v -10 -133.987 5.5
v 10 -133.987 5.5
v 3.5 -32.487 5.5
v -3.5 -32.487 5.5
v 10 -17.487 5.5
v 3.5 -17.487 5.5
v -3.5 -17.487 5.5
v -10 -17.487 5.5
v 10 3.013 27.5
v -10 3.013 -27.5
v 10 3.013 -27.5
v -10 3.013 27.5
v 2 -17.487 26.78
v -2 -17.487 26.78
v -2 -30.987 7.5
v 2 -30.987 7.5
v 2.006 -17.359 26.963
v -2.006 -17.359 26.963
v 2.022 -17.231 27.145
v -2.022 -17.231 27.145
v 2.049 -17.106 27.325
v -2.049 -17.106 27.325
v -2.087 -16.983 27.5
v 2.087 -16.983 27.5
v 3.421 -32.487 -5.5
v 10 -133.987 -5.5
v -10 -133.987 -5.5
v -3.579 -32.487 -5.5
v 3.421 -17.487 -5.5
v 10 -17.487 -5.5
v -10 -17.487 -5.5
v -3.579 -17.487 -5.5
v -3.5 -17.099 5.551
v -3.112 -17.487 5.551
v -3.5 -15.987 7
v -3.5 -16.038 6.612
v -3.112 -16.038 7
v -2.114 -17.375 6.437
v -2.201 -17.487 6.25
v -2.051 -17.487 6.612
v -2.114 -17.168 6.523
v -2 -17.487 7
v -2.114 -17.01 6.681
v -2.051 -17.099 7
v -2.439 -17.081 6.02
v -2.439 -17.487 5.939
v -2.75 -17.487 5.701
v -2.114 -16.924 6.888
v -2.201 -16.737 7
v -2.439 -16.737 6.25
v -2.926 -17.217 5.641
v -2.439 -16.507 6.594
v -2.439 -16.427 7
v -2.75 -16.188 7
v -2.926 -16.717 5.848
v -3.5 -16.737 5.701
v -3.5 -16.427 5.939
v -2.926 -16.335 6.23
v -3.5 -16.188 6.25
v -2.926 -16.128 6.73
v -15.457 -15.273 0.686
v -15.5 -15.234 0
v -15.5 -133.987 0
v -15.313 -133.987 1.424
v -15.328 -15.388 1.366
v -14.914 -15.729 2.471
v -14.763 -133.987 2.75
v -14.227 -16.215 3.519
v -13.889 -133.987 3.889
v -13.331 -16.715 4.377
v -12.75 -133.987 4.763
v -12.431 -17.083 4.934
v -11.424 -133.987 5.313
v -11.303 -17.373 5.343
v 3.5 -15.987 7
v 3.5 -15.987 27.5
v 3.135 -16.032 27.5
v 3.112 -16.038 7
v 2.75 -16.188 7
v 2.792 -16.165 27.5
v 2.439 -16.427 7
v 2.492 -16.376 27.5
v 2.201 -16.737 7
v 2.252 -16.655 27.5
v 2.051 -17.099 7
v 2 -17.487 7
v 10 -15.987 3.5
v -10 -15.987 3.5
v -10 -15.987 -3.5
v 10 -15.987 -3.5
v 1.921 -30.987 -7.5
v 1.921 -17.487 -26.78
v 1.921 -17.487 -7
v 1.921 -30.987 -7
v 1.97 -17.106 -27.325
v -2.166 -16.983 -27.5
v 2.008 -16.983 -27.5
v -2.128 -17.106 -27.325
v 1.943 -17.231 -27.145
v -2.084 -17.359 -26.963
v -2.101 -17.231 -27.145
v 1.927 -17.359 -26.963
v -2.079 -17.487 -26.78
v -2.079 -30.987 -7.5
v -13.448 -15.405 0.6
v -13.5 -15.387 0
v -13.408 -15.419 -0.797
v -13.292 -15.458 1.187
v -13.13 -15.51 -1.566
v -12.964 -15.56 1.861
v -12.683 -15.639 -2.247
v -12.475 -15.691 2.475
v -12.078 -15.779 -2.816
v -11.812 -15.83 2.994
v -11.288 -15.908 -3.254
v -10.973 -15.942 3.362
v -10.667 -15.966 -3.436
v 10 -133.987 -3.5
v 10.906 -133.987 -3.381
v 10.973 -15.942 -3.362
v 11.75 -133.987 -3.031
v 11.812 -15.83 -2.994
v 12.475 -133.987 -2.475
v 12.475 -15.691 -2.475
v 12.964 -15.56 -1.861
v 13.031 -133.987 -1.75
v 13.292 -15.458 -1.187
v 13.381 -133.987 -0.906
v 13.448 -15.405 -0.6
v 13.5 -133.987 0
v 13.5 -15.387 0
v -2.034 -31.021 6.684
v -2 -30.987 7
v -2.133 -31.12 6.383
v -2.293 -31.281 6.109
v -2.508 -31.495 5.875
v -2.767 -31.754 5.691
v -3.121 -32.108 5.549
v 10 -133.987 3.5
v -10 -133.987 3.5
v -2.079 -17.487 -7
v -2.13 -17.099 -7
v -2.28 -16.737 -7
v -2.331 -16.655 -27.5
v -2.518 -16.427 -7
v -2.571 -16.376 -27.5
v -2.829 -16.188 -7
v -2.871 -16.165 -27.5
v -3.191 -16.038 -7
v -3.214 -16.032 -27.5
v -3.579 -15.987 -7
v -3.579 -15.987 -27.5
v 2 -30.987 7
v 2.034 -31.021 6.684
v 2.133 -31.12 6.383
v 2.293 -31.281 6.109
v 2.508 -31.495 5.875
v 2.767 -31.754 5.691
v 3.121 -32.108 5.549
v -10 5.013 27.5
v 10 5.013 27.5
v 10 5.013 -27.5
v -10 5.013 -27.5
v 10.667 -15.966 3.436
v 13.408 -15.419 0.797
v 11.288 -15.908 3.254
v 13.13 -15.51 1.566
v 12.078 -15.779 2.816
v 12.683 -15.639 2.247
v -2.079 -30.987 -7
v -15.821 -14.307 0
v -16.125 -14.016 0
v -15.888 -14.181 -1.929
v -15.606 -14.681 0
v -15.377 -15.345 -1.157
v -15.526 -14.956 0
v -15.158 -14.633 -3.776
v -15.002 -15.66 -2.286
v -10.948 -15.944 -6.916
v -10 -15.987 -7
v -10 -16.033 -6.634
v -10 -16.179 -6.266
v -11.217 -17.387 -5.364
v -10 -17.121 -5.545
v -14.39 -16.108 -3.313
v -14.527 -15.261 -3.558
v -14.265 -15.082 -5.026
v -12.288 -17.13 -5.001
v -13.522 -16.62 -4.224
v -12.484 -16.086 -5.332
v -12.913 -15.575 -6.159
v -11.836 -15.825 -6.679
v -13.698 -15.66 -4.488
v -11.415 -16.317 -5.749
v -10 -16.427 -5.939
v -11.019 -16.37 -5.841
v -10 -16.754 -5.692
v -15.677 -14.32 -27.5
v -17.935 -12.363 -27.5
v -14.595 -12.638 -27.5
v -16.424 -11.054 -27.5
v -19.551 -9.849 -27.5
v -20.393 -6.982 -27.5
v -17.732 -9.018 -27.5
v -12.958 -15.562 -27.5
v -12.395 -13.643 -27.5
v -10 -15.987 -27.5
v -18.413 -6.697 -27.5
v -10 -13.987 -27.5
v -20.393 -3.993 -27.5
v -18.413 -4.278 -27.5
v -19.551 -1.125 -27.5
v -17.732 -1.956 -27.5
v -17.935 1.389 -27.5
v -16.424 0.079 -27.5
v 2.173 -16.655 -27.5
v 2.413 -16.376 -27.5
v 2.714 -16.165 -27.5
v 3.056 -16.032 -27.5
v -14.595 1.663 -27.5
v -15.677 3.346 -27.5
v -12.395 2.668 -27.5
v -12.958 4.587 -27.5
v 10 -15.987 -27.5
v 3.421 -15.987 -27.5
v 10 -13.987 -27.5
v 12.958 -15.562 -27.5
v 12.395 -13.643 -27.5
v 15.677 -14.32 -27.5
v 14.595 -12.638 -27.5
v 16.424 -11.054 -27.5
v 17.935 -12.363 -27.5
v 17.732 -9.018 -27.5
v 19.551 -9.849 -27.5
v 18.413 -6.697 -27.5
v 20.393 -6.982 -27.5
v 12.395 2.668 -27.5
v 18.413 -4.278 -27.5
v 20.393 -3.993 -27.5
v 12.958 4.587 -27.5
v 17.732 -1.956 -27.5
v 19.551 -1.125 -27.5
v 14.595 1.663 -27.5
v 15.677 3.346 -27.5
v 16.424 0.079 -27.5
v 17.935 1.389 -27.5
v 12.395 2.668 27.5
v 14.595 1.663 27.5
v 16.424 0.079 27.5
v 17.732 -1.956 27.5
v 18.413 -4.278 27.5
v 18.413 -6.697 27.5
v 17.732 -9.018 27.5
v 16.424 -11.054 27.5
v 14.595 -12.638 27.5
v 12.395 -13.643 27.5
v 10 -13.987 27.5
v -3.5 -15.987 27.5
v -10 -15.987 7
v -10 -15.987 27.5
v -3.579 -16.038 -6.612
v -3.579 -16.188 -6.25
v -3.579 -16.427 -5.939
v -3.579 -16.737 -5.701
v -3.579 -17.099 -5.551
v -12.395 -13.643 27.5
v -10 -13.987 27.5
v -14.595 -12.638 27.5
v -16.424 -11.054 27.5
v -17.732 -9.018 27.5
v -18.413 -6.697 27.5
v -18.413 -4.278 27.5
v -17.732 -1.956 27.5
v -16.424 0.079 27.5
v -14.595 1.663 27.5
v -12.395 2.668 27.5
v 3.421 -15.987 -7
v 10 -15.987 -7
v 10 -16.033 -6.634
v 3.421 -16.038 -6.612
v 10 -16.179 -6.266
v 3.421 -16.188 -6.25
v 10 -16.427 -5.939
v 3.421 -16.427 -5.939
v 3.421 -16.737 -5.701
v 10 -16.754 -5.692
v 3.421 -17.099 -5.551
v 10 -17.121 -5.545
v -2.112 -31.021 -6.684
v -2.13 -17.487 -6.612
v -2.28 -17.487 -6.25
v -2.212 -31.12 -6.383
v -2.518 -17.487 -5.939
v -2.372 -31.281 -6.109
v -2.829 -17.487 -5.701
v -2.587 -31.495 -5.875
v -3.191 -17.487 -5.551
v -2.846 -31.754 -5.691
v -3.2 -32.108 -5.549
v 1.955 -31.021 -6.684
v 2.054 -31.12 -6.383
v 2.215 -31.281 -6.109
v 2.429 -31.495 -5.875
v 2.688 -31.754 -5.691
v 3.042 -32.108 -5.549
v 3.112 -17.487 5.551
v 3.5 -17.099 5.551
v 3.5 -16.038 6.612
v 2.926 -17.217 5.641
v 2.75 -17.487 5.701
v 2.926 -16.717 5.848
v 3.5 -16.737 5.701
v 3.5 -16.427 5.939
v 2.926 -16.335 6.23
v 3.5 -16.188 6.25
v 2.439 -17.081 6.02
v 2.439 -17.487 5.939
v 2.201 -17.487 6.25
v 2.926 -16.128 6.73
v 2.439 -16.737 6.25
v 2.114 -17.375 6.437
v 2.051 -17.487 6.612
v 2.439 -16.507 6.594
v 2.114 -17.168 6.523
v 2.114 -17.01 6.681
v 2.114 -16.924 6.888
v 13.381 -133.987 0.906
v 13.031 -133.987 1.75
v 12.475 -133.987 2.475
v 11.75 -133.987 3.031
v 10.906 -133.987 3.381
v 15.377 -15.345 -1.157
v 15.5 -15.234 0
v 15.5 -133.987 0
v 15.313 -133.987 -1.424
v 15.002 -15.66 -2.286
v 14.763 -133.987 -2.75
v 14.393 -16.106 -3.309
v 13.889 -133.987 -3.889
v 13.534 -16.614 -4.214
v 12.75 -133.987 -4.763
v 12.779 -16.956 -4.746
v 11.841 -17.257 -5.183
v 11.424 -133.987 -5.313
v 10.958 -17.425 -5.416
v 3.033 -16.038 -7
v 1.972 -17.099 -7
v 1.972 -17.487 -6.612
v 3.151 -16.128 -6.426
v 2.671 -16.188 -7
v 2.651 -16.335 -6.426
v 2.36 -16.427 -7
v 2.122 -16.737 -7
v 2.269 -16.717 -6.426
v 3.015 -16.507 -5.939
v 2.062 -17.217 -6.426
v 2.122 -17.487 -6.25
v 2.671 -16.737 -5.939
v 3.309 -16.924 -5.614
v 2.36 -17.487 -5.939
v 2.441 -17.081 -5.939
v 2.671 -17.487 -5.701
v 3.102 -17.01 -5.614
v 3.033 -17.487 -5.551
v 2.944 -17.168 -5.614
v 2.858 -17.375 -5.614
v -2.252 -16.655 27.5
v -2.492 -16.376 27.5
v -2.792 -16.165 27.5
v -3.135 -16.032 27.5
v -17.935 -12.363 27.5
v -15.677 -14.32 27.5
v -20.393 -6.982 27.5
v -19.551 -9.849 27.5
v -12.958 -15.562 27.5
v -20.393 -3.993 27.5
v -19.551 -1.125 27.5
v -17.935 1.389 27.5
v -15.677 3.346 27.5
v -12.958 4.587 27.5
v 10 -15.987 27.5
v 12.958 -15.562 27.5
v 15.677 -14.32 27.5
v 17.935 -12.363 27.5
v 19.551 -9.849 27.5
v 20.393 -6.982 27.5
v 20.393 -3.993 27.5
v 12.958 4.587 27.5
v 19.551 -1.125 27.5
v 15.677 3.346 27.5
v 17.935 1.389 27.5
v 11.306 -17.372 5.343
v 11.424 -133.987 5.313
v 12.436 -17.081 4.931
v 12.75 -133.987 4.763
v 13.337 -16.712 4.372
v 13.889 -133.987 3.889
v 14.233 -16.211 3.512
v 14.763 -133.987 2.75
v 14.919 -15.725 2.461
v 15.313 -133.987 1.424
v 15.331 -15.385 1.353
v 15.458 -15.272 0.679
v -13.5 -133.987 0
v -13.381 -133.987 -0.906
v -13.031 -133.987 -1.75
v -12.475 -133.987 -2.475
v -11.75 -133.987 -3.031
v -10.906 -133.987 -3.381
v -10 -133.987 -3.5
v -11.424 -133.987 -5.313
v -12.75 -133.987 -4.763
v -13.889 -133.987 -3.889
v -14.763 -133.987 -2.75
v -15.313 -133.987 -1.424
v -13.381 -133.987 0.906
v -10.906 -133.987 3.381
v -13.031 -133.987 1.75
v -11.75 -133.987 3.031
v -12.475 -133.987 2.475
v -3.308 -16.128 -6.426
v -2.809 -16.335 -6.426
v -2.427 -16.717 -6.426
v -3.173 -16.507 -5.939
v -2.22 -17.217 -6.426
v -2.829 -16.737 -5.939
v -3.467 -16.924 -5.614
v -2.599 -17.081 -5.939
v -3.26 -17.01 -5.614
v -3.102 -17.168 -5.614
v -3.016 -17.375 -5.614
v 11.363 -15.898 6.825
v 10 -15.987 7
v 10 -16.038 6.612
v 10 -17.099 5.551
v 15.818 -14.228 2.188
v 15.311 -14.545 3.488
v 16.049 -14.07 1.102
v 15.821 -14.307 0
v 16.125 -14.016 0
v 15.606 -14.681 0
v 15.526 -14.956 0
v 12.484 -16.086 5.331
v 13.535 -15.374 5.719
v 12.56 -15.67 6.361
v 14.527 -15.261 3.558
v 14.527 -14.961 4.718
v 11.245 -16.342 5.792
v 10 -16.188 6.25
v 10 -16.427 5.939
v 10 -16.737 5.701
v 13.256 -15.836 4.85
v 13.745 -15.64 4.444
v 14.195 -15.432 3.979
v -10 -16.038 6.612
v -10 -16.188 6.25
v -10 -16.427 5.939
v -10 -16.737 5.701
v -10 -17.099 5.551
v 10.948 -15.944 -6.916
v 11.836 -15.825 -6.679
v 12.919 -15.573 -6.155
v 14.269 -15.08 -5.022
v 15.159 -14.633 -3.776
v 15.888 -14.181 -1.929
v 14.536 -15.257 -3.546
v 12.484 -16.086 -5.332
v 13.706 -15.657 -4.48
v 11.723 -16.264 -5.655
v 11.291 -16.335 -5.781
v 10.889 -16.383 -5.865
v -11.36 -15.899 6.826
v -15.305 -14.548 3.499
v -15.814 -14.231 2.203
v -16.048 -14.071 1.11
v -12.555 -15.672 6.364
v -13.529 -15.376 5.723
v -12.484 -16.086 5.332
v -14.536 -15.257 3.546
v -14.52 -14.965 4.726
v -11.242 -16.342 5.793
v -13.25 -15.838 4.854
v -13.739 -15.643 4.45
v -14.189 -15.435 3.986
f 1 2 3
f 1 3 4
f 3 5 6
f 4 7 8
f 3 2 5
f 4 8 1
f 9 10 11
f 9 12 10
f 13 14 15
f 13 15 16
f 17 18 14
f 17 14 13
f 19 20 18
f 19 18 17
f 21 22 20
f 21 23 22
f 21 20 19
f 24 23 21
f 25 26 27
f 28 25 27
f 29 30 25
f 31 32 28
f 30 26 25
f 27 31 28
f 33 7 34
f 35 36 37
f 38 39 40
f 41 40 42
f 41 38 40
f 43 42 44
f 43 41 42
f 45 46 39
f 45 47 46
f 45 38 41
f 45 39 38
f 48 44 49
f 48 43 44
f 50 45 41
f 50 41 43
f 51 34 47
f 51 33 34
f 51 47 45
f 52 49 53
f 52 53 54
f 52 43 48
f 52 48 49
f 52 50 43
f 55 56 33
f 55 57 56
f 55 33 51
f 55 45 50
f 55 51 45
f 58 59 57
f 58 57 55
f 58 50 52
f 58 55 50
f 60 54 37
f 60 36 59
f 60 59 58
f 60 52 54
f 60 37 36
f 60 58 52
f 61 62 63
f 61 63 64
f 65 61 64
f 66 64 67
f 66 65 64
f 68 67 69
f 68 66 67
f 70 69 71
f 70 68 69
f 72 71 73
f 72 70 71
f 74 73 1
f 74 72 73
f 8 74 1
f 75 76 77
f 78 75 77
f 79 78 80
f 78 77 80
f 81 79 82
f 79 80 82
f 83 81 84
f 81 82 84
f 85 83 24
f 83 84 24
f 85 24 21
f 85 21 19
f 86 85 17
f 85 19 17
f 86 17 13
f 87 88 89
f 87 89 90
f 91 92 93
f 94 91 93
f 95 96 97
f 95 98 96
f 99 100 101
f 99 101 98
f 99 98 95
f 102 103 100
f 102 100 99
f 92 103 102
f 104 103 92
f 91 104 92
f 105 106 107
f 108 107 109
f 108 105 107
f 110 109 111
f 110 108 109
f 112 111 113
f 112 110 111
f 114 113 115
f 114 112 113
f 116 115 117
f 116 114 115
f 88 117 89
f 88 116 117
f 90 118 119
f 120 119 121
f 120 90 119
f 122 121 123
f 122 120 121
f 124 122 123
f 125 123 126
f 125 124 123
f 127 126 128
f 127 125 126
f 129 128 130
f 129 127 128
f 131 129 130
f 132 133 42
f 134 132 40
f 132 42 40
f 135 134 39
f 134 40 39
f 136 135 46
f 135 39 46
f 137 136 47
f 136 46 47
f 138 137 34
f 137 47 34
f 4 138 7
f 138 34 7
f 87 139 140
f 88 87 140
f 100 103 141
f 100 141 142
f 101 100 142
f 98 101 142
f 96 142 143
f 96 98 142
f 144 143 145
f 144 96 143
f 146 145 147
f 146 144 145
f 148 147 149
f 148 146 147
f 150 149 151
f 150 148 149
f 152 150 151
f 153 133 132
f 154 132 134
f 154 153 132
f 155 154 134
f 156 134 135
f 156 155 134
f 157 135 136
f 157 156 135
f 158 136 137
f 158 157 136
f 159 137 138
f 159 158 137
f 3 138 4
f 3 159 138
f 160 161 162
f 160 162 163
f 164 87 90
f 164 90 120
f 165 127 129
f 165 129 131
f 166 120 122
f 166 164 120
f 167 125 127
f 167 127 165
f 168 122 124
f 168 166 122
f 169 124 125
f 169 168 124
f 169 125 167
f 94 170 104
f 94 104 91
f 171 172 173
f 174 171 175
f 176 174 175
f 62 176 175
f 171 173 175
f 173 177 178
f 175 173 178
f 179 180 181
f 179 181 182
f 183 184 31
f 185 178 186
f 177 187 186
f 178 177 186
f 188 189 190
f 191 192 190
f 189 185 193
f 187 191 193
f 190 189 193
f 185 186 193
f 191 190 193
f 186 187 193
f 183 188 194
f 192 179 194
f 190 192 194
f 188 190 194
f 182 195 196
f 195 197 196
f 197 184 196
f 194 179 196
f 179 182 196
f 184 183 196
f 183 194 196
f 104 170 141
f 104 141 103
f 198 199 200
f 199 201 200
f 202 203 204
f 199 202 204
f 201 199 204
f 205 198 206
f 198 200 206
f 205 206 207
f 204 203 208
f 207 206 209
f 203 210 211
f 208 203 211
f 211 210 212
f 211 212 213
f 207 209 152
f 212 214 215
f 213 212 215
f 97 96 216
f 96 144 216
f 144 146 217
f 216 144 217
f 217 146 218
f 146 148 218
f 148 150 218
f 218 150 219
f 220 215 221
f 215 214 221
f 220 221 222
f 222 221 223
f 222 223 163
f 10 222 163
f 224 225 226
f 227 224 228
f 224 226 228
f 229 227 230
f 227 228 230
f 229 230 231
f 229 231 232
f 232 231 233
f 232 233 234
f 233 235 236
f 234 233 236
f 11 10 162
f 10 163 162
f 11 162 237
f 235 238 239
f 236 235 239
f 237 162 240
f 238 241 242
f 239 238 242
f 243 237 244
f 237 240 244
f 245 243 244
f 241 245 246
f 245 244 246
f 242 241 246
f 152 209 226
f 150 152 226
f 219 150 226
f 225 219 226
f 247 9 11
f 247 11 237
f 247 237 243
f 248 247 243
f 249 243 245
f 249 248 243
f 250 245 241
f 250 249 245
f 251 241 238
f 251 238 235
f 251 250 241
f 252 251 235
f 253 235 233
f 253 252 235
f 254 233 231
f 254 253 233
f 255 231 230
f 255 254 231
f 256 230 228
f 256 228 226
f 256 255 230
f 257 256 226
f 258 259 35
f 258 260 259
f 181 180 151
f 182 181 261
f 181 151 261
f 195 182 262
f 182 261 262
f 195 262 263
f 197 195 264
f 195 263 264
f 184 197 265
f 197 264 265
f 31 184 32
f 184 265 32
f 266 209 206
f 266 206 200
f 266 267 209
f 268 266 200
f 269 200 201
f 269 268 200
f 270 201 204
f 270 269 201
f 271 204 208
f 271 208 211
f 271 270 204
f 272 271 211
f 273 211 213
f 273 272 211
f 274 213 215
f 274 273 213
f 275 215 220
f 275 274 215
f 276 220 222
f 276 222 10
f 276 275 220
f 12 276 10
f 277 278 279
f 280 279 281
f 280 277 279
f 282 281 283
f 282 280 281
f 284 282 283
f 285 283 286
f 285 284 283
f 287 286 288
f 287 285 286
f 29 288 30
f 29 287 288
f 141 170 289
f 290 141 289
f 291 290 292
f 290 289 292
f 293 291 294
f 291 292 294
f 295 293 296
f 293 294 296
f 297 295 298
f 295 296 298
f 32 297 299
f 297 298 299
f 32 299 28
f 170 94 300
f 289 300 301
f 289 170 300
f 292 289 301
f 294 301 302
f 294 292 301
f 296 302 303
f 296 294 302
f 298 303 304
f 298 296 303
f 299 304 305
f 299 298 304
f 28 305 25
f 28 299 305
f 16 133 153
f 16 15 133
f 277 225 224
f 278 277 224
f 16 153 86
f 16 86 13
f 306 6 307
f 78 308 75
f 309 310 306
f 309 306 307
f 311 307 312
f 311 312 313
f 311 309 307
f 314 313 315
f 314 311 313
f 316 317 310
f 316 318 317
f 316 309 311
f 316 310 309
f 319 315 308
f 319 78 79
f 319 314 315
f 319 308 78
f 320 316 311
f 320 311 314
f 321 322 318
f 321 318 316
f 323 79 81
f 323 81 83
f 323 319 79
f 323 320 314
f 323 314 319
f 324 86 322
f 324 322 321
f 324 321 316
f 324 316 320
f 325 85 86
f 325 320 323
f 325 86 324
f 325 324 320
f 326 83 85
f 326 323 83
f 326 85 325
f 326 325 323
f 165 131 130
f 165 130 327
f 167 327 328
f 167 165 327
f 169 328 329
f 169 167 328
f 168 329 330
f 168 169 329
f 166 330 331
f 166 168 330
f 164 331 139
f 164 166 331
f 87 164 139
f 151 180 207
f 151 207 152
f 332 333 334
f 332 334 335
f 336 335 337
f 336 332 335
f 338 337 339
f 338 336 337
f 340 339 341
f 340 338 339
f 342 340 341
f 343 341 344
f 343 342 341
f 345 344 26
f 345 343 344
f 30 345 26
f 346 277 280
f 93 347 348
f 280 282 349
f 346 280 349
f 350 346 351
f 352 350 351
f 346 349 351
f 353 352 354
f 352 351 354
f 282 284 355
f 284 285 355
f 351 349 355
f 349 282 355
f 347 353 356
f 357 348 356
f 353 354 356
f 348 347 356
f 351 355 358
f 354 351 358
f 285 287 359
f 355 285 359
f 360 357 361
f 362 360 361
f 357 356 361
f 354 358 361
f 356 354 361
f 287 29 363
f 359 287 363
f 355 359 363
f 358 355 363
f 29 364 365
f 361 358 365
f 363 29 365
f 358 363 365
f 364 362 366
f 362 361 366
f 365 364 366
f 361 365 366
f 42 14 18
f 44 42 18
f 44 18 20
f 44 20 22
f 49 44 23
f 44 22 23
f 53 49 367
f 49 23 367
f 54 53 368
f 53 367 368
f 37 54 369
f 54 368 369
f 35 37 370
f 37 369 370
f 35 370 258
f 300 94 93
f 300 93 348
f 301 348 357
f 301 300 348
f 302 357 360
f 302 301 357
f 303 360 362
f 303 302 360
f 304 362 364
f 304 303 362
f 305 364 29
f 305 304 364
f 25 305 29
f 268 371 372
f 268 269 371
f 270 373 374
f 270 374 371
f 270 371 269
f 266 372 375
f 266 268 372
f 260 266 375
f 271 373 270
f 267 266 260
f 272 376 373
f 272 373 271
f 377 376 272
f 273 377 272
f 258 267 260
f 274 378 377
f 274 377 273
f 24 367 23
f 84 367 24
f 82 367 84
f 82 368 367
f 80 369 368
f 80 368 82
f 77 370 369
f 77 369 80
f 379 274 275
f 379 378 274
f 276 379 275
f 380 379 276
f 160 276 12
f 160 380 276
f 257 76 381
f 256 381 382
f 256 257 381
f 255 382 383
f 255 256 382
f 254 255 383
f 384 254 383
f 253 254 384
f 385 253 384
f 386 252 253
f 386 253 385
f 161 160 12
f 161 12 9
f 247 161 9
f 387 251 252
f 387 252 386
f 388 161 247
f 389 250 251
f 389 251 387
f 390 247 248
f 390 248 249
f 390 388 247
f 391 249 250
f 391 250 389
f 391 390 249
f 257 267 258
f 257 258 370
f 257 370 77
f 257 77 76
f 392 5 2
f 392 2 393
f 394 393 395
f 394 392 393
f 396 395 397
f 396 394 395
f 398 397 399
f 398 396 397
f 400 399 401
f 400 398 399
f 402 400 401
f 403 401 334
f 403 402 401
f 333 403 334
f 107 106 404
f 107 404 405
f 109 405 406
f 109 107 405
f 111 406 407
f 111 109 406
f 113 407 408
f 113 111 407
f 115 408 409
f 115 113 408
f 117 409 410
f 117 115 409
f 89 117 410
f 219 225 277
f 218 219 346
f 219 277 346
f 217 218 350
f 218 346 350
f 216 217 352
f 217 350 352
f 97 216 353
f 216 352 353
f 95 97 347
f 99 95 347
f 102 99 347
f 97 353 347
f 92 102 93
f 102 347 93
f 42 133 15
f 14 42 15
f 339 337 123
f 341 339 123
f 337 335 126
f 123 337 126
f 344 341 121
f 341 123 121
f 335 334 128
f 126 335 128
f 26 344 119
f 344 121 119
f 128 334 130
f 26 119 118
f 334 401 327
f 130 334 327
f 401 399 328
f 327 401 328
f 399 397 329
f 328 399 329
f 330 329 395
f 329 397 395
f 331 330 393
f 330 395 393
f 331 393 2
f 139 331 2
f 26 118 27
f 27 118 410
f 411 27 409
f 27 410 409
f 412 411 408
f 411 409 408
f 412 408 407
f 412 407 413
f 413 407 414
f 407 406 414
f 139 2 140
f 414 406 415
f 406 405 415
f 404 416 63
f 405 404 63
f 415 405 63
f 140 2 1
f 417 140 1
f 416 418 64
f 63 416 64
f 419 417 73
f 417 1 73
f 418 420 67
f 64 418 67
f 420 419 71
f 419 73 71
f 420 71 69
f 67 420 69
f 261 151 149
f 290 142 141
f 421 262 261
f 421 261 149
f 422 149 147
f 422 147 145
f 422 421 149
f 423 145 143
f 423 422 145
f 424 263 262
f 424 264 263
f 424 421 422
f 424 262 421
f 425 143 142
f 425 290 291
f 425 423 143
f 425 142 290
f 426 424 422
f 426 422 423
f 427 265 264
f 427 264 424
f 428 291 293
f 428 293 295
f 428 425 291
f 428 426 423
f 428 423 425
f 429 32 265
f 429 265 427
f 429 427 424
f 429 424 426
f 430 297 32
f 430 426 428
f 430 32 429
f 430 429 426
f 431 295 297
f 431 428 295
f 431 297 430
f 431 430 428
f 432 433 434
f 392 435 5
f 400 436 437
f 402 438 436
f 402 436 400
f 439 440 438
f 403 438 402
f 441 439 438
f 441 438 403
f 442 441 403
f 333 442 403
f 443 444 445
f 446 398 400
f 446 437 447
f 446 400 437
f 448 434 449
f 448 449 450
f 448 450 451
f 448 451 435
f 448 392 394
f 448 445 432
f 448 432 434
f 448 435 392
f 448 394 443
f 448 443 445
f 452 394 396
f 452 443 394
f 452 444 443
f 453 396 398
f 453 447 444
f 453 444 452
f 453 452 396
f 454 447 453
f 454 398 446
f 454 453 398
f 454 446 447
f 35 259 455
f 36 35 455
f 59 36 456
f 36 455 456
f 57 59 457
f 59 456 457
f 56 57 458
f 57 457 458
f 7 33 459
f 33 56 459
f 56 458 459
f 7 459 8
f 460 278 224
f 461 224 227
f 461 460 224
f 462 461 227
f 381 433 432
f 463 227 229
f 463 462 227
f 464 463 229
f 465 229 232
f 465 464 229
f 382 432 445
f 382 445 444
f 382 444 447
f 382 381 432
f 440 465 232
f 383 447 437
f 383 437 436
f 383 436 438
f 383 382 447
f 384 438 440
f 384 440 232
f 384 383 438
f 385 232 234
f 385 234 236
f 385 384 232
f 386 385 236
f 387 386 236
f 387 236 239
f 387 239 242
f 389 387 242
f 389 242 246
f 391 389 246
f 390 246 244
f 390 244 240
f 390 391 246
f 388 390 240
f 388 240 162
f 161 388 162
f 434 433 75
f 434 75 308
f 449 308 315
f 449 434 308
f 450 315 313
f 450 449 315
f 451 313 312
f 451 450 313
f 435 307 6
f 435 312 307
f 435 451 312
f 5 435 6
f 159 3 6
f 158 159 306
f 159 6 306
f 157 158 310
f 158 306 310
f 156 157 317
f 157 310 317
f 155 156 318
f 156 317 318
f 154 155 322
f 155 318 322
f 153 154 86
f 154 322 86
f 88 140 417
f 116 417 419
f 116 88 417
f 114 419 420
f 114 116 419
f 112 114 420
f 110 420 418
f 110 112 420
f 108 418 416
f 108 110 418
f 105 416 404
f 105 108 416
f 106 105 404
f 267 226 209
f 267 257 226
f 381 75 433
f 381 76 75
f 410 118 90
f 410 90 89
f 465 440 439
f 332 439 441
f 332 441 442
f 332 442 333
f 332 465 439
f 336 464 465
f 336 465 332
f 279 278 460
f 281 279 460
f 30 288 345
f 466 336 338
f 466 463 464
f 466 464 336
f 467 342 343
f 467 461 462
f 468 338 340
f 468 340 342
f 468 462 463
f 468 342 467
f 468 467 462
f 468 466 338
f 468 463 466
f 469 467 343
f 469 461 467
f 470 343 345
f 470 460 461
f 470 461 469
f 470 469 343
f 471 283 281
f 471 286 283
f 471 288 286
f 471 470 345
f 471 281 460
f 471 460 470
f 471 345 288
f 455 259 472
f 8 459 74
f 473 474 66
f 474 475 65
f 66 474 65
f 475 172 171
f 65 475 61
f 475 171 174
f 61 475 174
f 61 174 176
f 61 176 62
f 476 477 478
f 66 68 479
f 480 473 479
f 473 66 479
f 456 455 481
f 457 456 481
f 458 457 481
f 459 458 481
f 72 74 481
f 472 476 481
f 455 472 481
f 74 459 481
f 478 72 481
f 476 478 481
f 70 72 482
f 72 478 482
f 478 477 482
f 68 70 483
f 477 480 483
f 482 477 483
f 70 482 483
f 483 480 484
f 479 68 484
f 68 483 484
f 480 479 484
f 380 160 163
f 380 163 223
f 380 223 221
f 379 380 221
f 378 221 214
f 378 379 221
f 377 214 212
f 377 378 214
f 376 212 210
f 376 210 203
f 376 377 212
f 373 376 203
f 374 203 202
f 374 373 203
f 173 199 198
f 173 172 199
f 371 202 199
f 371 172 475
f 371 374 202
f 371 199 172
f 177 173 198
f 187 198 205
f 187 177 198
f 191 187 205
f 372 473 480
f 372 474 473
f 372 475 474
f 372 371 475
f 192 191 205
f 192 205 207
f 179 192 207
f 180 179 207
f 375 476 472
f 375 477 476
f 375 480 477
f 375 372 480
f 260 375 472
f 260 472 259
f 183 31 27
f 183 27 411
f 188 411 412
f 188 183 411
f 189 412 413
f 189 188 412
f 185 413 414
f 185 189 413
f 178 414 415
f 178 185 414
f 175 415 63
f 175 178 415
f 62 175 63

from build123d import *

# Parameters (mm, degrees)
F1_DEPTH = 27.5
F2_W     = 20
F2_H     = 2
F3_DEPTH = 120
F4_W     = 4
F4_H     = 22
F5_DEPTH = 15
F6_SIZE2 = 14.0041507642
F6_SIZE  = 20
F8_DEPTH = 15
F9_SIZE2 = 20
F9_SIZE  = 14.0041507642
F10_F1_R = 1.5
F10_F2_R = 1.5
F10_F3_R = 1.5
F10_F4_R = 1.5
F10_F5_R = 1.5
F10_F6_R = 1.5
F10_F7_R = 1.5
F10_F8_R = 1.5


# Not quite as in the source:
# - a feature names something its author has since deleted; it is built from what else it names


with BuildPart() as f1:
    # F0 (on Top) → F1 (new body, symmetric)
    with BuildSketch(Plane.XY):
        with BuildLine():
            Line((-10, -15.9872266478), (0, -15.9872266478))
            Line((0, -15.9872266478), (10, -15.9872266478))
            ThreePointArc((10, -15.9872266478), (20.5, -5.4872266478), (10, 5.0127733522))
            Line((10, 5.0127733522), (0, 5.0127733522))
            Line((0, 5.0127733522), (-10, 5.0127733522))
            ThreePointArc((-10, 5.0127733522), (-20.5, -5.4872266478), (-10, -15.9872266478))
        make_face()
        with BuildLine():
            Line((0, 3.0127733522), (10, 3.0127733522))
            ThreePointArc((10, 3.0127733522), (18.5, -5.4872266478), (10, -13.9872266478))
            Line((10, -13.9872266478), (0, -13.9872266478))
            Line((0, -13.9872266478), (-10, -13.9872266478))
            ThreePointArc((-10, -13.9872266478), (-18.5, -5.4872266478), (-10, 3.0127733522))
            Line((-10, 3.0127733522), (0, 3.0127733522))
        make_face(mode=Mode.SUBTRACT)
    extrude(amount=F1_DEPTH, both=True)

    # F2 (on face) → F3 (join)
    with BuildSketch(Plane(origin=(0, -13.9872266478, 0), x_dir=(-1, 0, 0), z_dir=(0, 1, 0))):
        with Locations((0, -4.5)):
            Rectangle(F2_W, F2_H)
        with BuildLine():
            ThreePointArc((-15.5, 0), (-13.8890872965, -3.8890872965), (-10, -5.5))
            Line((-10, -5.5), (-10, -3.5))
            ThreePointArc((-10, -3.5), (-12.4748737342, -2.4748737342), (-13.5, 0))
            ThreePointArc((-13.5, 0), (-12.4748737342, 2.4748737342), (-10, 3.5))
            Line((-10, 3.5), (-10, 5.5))
            ThreePointArc((-10, 5.5), (-13.8890872965, 3.8890872965), (-15.5, 0))
        make_face()
        with BuildLine():
            Line((10, -3.5), (10, -5.5))
            ThreePointArc((10, -5.5), (13.8890872965, -3.8890872965), (15.5, 0))
            ThreePointArc((15.5, 0), (13.8890872965, 3.8890872965), (10, 5.5))
            Line((10, 5.5), (10, 3.5))
            ThreePointArc((10, 3.5), (12.4748737342, 2.4748737342), (13.5, 0))
            ThreePointArc((13.5, 0), (12.4748737342, -2.4748737342), (10, -3.5))
        make_face()
        with Locations((0, 4.5)):
            Rectangle(F2_W, F2_H)
    extrude(amount=-F3_DEPTH)

    # F4 (on face) → F5 (join)
    with BuildSketch(Plane.XZ.offset(15.9872266478)):
        with Locations((0, 16.5)):
            Rectangle(F4_W, F4_H)
    extrude(amount=F5_DEPTH)

    # F6
    f6_edges = [f1.edges().sort_by_distance(p)[0] for p in [
        (0, -30.987227, 27.5),
    ]]
    f6_side = f1.faces().sort_by_distance((0, -30.987227, 16.5))[0]
    chamfer(f6_edges, length=F6_SIZE, length2=F6_SIZE2, reference=f6_side)

    # F7 (on face) → F8 (join)
    with BuildSketch(Plane.XZ.offset(15.9872266478)):
        Polygon((1.9211450554, -5.5), (0, -5.5), (-2.0788549446, -5.5), (-2.0788549446, -27.5), (1.9211450554, -27.5), align=None)
    extrude(amount=F8_DEPTH)

    # F9
    f9_edges = [f1.edges().sort_by_distance(p)[0] for p in [
        (-0.078855, -30.987227, -27.5),
    ]]
    f9_side = f1.faces().sort_by_distance((-6.039427, -15.441608, -27.5))[0]
    chamfer(f9_edges, length=F9_SIZE, length2=F9_SIZE2, reference=f9_side)

    # F10: fillet of radius 1.5 on 12 edges, made by hand

    # F10_f1
    f10_f1_edges = [f1.edges().sort_by_distance(p)[0] for p in [
        (-2.0788549446, -15.9872266478, -16.5),
    ]]
    fillet(f10_f1_edges, radius=F10_F1_R)

    # F10_f2
    f10_f2_edges = [f1.edges().sort_by_distance(p)[0] for p in [
        (-2.0788549446, -24.2372266478, -5.5),
    ]]
    fillet(f10_f2_edges, radius=F10_F2_R)

    # F10_f3
    f10_f3_edges = [f1.edges().sort_by_distance(p)[0] for p in [
        (1.9211450554, -15.9872266478, -16.5),
    ]]
    fillet(f10_f3_edges, radius=F10_F3_R)

    # F10_f4
    f10_f4_edges = [f1.edges().sort_by_distance(p)[0] for p in [
        (1.9211450554, -24.2372266478, -5.5),
    ]]
    fillet(f10_f4_edges, radius=F10_F4_R)

    # F10_f5
    f10_f5_edges = [f1.edges().sort_by_distance(p)[0] for p in [
        (-0.0788549446, -30.9872266478, -5.5),
    ]]
    fillet(f10_f5_edges, radius=F10_F5_R)

    # F10_f6
    f10_f6_edges = [f1.edges().sort_by_distance(p)[0] for p in [
        (-2, -15.9872266478, 17.25),
    ]]
    fillet(f10_f6_edges, radius=F10_F6_R)

    # F10_f7
    f10_f7_edges = [f1.edges().sort_by_distance(p)[0] for p in [
        (2, -15.9872266478, 17.25),
    ]]
    fillet(f10_f7_edges, radius=F10_F7_R)

    # F10_f8
    f10_f8_edges = [f1.edges().sort_by_distance(p)[0] for p in [
        (0, -30.9872266478, 5.5),
    ]]
    fillet(f10_f8_edges, radius=F10_F8_R)


solid = f1.part
